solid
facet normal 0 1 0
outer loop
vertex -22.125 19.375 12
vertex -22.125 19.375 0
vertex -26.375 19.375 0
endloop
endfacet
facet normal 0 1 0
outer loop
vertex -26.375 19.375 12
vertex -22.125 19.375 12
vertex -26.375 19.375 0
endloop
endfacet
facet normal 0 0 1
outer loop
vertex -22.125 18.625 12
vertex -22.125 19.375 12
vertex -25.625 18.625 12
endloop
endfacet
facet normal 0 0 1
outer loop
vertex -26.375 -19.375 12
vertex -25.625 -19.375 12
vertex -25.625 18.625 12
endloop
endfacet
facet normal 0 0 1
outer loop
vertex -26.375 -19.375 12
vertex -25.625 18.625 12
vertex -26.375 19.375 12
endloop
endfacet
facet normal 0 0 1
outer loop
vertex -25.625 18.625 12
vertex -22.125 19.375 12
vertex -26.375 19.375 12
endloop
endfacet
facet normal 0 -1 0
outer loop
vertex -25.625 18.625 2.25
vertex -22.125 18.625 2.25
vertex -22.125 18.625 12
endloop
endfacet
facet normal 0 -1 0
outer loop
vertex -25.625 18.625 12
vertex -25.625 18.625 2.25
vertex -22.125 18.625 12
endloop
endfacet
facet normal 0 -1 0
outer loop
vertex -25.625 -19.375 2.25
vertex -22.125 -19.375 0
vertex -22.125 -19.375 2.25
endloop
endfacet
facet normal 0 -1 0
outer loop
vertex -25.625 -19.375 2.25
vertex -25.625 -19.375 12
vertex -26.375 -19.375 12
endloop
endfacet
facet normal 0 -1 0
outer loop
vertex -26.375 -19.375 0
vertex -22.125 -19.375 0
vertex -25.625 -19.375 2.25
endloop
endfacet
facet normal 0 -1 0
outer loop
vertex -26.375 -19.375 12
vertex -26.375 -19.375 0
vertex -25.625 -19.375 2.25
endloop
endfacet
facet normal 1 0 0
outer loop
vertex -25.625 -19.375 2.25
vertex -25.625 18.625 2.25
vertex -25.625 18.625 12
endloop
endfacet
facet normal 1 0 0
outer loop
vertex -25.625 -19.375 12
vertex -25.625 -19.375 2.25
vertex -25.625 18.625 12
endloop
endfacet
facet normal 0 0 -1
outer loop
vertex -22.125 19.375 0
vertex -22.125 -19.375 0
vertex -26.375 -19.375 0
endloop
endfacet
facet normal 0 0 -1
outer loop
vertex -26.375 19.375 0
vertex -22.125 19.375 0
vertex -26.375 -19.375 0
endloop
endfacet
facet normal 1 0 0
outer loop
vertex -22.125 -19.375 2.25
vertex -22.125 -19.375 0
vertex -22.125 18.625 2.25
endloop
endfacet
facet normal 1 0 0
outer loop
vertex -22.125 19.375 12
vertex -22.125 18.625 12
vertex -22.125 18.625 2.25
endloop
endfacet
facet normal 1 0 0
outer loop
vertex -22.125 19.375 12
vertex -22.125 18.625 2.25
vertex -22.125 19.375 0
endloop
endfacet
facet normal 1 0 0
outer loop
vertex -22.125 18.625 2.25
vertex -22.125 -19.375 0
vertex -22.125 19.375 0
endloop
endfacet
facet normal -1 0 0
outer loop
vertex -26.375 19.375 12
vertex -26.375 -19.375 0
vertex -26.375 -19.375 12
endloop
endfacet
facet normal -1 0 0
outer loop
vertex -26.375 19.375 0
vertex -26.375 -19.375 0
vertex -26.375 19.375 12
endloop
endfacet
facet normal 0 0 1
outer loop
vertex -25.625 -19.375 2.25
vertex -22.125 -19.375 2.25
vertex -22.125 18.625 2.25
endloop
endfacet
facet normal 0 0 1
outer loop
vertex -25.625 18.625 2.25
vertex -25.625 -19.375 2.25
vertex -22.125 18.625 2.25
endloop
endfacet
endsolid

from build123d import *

# Parameters (mm, degrees)
SKETCH1_W           = 4.25
SKETCH1_H           = 38.75
BOSS_EXTRUDE1_DEPTH = 12
SKETCH2_W           = 9.75
SKETCH2_H           = 38
CUT_EXTRUDE1_DEPTH  = 3.5


with BuildPart() as part:
    # Sketch1 → Boss-Extrude1 (new body)
    with BuildSketch(Plane.XY):
        Rectangle(SKETCH1_W, SKETCH1_H)
    extrude(amount=BOSS_EXTRUDE1_DEPTH)

    # Sketch2 → Cut-Extrude1 (cut)
    with BuildSketch(Plane.ZY.offset(2.125)):
        with Locations((7.125, -0.375)):
            Rectangle(SKETCH2_W, SKETCH2_H)
    extrude(amount=-CUT_EXTRUDE1_DEPTH, mode=Mode.SUBTRACT)


with BuildPart() as body_2:
    # Mirror2: mirrored copy
    add(part.part.mirror(Plane.ZY.offset(12.125)))


solid = body_2.part
